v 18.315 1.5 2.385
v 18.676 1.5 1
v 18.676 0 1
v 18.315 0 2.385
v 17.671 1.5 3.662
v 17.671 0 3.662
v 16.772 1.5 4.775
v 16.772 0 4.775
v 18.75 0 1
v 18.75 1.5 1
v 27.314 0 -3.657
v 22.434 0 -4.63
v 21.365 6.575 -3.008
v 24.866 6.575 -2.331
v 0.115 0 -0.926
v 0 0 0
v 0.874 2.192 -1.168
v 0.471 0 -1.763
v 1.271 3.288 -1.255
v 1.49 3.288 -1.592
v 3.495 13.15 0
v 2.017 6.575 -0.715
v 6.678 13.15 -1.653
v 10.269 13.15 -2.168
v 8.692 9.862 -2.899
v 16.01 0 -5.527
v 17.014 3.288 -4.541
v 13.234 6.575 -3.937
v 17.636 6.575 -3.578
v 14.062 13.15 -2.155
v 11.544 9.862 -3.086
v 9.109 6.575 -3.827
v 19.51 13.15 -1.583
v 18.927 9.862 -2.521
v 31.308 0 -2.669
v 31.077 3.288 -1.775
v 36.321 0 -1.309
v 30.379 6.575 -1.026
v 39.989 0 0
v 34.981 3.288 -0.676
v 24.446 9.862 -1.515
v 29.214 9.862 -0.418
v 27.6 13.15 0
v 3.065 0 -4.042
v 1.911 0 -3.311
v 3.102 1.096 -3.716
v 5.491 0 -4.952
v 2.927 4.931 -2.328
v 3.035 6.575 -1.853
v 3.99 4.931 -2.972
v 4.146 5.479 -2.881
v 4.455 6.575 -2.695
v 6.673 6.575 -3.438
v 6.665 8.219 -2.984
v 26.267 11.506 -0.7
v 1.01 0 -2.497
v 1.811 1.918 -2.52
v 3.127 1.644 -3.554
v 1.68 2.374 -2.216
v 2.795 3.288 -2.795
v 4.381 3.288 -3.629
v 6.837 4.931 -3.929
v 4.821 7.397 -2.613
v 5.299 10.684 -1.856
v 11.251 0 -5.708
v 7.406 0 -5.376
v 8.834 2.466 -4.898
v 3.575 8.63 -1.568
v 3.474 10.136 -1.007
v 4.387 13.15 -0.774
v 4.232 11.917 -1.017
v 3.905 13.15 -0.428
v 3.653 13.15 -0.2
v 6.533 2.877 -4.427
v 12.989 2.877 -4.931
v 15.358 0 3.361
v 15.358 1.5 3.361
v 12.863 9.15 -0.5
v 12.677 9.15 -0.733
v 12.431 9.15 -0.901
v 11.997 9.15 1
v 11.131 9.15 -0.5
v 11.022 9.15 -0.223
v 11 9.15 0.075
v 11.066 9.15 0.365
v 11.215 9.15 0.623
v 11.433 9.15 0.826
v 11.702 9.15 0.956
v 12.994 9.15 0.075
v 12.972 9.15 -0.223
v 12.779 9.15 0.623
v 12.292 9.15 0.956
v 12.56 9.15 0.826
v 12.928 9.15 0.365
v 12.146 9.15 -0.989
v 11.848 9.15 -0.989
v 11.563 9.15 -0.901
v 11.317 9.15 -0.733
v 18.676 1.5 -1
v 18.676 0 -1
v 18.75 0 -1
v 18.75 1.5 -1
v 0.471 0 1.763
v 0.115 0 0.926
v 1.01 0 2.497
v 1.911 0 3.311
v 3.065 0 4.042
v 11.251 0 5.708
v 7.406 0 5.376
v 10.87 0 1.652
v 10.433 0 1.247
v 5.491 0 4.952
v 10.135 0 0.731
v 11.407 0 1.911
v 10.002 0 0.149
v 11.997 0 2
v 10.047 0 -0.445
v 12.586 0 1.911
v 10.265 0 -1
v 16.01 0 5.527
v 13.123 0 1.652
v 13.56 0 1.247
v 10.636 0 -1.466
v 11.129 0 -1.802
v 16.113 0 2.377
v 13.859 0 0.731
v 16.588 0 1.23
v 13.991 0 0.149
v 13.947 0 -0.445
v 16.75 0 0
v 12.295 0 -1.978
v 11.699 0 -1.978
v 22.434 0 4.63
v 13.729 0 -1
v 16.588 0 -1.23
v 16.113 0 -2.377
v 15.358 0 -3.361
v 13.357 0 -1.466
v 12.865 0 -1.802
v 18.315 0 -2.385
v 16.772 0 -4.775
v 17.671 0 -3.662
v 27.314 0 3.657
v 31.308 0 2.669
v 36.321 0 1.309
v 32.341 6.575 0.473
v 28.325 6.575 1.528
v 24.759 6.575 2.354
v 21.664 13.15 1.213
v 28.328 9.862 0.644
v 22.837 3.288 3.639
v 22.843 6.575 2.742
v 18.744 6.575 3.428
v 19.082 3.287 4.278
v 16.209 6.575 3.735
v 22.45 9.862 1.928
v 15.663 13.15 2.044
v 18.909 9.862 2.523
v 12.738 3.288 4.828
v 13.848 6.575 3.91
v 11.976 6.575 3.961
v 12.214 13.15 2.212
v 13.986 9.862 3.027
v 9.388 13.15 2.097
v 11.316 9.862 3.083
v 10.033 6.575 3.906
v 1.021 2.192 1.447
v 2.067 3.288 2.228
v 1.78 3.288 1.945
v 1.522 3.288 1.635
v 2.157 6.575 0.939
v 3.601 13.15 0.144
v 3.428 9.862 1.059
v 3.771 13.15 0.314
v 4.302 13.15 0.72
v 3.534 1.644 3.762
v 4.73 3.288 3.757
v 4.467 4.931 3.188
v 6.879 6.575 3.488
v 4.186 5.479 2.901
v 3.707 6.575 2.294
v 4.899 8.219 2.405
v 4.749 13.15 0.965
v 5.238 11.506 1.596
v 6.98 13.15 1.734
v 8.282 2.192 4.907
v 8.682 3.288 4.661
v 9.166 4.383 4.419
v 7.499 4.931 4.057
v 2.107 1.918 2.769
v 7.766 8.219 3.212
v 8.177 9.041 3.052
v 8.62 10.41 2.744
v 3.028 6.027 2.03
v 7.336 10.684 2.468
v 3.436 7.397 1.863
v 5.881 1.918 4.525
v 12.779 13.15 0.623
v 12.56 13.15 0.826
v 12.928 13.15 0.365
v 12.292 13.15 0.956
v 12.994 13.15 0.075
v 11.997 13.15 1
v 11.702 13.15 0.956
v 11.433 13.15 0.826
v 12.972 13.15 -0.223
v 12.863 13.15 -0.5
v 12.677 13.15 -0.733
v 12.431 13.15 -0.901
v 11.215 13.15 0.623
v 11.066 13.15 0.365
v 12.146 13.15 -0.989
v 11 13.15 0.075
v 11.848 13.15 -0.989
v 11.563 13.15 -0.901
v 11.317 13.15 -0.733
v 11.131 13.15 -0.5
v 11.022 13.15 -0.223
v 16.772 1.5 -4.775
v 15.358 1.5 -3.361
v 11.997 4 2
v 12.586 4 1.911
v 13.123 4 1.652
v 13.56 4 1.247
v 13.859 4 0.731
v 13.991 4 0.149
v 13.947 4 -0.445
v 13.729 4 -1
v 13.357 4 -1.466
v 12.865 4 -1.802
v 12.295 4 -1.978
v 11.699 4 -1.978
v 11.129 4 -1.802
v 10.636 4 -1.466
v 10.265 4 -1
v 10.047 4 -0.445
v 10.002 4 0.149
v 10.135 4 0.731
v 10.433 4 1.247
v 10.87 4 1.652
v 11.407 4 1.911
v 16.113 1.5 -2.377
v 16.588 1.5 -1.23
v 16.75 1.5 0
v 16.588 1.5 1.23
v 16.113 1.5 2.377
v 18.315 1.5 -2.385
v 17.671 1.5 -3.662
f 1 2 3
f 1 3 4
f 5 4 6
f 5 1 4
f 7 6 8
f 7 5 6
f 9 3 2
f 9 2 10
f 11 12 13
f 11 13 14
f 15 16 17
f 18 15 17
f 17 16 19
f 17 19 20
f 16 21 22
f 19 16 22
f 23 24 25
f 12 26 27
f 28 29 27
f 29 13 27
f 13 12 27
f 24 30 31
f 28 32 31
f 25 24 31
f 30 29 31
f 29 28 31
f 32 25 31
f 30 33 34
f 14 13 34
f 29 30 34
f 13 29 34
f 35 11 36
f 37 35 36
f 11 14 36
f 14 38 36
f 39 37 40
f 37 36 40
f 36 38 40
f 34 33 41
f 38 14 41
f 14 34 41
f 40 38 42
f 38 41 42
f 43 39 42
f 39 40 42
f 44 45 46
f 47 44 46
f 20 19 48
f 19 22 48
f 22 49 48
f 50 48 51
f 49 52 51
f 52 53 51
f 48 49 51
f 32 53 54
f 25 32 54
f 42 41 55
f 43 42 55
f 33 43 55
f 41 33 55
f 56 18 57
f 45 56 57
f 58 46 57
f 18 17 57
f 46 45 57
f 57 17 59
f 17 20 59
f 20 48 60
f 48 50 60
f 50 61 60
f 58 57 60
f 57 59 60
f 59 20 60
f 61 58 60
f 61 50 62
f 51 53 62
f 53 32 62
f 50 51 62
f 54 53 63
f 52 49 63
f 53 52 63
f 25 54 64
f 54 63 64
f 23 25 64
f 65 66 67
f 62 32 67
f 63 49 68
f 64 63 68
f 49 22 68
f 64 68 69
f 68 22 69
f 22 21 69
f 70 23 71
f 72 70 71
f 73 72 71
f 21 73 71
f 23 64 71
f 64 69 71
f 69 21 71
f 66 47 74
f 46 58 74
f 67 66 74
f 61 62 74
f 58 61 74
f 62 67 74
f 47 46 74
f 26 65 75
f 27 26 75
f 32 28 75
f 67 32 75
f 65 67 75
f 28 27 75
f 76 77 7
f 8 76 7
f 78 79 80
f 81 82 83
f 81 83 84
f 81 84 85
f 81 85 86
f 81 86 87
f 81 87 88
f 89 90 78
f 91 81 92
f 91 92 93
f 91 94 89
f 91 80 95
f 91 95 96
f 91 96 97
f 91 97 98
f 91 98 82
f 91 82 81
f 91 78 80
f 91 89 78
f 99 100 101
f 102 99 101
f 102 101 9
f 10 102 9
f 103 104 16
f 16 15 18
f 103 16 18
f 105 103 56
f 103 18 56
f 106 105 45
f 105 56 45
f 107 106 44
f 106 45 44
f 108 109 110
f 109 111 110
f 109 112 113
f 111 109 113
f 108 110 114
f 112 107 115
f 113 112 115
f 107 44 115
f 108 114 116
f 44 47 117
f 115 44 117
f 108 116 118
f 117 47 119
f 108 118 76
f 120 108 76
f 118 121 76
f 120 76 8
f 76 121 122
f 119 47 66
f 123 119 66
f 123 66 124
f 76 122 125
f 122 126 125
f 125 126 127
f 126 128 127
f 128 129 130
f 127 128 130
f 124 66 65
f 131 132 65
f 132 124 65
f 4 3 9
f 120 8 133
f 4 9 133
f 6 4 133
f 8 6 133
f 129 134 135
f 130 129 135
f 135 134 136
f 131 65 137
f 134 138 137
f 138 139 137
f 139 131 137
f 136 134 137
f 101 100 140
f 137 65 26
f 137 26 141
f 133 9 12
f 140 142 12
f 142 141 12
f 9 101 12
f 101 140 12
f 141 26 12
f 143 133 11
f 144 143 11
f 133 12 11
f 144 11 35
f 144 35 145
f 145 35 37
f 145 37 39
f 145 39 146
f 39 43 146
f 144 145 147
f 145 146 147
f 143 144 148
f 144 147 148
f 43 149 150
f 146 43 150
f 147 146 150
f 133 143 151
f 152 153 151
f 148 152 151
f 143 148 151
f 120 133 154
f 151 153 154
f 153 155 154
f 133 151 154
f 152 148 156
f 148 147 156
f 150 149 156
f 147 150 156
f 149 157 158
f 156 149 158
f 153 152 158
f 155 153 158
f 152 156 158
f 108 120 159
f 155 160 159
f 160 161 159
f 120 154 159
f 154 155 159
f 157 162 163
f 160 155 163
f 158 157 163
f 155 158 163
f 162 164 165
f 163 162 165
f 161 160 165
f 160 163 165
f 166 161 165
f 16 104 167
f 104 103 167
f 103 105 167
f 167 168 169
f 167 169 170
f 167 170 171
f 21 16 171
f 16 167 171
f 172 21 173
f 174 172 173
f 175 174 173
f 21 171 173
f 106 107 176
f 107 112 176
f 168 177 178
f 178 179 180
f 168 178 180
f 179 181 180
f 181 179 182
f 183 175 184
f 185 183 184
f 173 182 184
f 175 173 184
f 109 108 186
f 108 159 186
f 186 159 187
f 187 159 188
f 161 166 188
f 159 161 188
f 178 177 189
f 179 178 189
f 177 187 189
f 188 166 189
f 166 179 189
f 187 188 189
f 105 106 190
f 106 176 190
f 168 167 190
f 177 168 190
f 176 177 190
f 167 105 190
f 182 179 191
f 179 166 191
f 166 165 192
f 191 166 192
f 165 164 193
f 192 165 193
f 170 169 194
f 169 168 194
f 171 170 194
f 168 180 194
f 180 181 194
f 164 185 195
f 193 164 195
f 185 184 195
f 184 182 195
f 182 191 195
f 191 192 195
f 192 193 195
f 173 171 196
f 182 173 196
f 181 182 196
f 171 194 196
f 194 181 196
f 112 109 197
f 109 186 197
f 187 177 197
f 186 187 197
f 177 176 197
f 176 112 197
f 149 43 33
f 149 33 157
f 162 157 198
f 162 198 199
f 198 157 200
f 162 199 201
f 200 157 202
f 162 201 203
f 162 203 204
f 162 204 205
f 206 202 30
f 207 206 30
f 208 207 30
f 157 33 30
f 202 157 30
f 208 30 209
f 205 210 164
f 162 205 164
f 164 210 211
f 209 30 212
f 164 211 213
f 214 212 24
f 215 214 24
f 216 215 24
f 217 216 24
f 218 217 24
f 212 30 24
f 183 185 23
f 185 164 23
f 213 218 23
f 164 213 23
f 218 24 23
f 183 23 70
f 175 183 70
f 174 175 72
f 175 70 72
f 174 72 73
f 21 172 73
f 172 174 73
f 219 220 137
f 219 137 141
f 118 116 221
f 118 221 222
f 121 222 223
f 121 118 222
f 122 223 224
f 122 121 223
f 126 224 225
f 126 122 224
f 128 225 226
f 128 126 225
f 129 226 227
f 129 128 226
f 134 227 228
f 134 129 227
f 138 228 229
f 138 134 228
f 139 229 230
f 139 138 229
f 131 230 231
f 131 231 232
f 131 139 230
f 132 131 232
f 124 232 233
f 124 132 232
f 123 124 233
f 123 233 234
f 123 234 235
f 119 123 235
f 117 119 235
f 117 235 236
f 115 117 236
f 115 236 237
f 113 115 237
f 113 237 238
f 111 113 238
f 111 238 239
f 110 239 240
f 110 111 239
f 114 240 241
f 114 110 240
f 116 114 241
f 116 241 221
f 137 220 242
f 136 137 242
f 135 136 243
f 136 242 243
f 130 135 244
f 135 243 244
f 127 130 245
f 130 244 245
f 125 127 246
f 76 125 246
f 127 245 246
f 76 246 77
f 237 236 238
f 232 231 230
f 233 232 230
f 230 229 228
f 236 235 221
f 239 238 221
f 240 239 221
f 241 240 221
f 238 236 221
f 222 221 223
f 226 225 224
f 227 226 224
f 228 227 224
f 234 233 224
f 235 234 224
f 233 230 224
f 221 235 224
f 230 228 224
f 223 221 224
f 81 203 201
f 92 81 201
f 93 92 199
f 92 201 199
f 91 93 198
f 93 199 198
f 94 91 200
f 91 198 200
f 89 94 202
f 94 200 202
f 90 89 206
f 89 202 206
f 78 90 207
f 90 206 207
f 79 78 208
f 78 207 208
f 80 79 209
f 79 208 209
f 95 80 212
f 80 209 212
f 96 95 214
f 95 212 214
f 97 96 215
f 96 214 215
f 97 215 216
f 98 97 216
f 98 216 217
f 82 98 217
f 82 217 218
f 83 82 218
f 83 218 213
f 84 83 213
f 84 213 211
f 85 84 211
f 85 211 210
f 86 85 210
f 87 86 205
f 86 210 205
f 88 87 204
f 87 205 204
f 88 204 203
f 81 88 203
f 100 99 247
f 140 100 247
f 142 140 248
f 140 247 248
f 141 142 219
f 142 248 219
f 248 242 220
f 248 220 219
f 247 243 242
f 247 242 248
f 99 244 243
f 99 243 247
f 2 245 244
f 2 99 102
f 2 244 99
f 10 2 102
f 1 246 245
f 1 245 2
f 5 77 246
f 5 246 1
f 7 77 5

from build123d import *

# Parameters (mm, degrees)
SKETCH_3_R                    = 2
CUT_EXTRUDE_1_DEPTH           = 4
SKETCH_4_R                    = 1
CUT_EXTRUDE_2_DEPTH           = 4
CUT_EXTRUDE_3_DEPTH           = 1.5
SKETCH_7_W                    = 2
SKETCH_7_H                    = 1.5
CUT_REVOLVE_1_ANGLE           = 45
CUT_REVOLVE_1_OTHER_WAY_ANGLE = 45


with BuildPart() as part:
    # Эскиз1 → По сечениям1 section 0
    with BuildSketch(Plane(origin=(0, 0, 0), x_dir=(1, 0, 0), z_dir=(0, 1, 0))):
        with BuildLine():
            add(Edge.make_bspline(
                [(0, 0), (-0.026786257, 0.969360716), (0.61737566, 2.249301934), (1.974829337, 3.392775644), (2.993920842, 4.051952658), (4.355720519, 4.565101355), (5.990808256, 5.164346361), (8.017850303, 5.478919266), (10.008939201, 5.685410864), (12.675837367, 5.745020865), (16.011358195, 5.571319168), (20.019187774, 5.094065908), (23.99962122, 4.335399659), (28.002273256, 3.548249918), (31.989584978, 2.480873774), (36.034216793, 1.4621658), (38.689482894, 0.534654706), (39.98934, 0)],
                knots=[0, 0, 0, 0, 0.063515889, 0.095125078, 0.12262418, 0.147418569, 0.196010901, 0.243367076, 0.289416436, 0.335172983, 0.428593629, 0.521350126, 0.61548124, 0.710185536, 0.804793671, 0.902313957, 1, 1, 1, 1], degree=3))
            add(Edge.make_bspline(
                [(0, 0), (-0.026786257, -0.969360716), (0.61737566, -2.249301934), (1.974829337, -3.392775644), (2.993920842, -4.051952658), (4.355720519, -4.565101355), (5.990808256, -5.164346361), (8.017850303, -5.478919266), (10.008939201, -5.685410864), (12.675837367, -5.745020865), (16.011358195, -5.571319168), (20.019187774, -5.094065908), (23.99962122, -4.335399659), (28.002273256, -3.548249918), (31.989584978, -2.480873774), (36.034216793, -1.4621658), (38.689482894, -0.534654706), (39.98934, 0)],
                knots=[0, 0, 0, 0, 0.063515889, 0.095125078, 0.12262418, 0.147418569, 0.196010901, 0.243367076, 0.289416436, 0.335172983, 0.428593629, 0.521350126, 0.61548124, 0.710185536, 0.804793671, 0.902313957, 1, 1, 1, 1], degree=3))
        make_face()
    # Эскиз2 → По сечениям1 section 1
    with BuildSketch(Plane(origin=(0, 13.15, 0), x_dir=(1, 0, 0), z_dir=(0, 1, 0))):
        with BuildLine():
            add(Edge.make_bspline(
                [(27.600495608, 0), (26.597023876, 0.239787804), (25.590303432, 0.450633429), (24.07845351, 0.751139895), (23.574236087, 0.848926057), (22.565707302, 1.043661503), (22.061334673, 1.140064965), (20.547046456, 1.418849109), (19.535800832, 1.589380729), (17.506159089, 1.866741534), (16.488154051, 1.977054776), (14.445960524, 2.142594028), (13.421688191, 2.197073085), (11.878361295, 2.217156944), (11.362851505, 2.21434148), (10.328296524, 2.177214316), (9.808955229, 2.140264674), (9.027129396, 2.059771774), (8.766490273, 2.029170171), (8.246673774, 1.962396763), (7.98718809, 1.926435537), (7.470450481, 1.84090371), (7.213172633, 1.791491042), (6.703084975, 1.665443783), (6.451257898, 1.58763007), (5.953139588, 1.420127607), (5.706204125, 1.330156877), (5.336512255, 1.193117575), (5.213271138, 1.147312759), (4.967522086, 1.054347625), (4.844966339, 1.007283734), (4.485806342, 0.850578332), (4.26912101, 0.704612862), (3.95354488, 0.468428314), (3.84988299, 0.385871664), (3.704605146, 0.253019135), (3.657777639, 0.207183214), (3.570159407, 0.109650945), (3.528407556, 0.058887646), (3.495024534, 0)],
                knots=[0, 0, 0, 0, 0.125, 0.125, 0.1875, 0.1875, 0.25, 0.25, 0.375, 0.375, 0.5, 0.5, 0.625, 0.625, 0.6875, 0.6875, 0.75, 0.75, 0.78125, 0.78125, 0.8125, 0.8125, 0.84375, 0.84375, 0.875, 0.875, 0.90625, 0.90625, 0.921875, 0.921875, 0.9375, 0.9375, 0.96875, 0.96875, 0.984375, 0.984375, 0.9921875, 0.9921875, 1, 1, 1, 1], degree=3))
            add(Edge.make_bspline(
                [(3.495024534, 0), (3.527836487, -0.057880281), (3.570196415, -0.109749182), (3.658869962, -0.20834136), (3.70652894, -0.254882194), (3.853181237, -0.388672418), (3.956462947, -0.470726548), (4.167794949, -0.628660052), (4.275587446, -0.704873243), (4.499789963, -0.846140938), (4.615390753, -0.907467588), (4.853487439, -1.01062304), (4.974416307, -1.056988781), (5.216688696, -1.148571028), (5.338066313, -1.193693034), (5.702321862, -1.328718991), (5.945643298, -1.417393741), (6.436562197, -1.582891985), (6.684094371, -1.659896431), (7.189108296, -1.786329481), (7.445644373, -1.836258275), (7.9566654, -1.921867633), (8.212450695, -1.957701806), (8.724233006, -2.023999353), (8.980232008, -2.054412341), (9.748649974, -2.134972616), (10.261536754, -2.173252617), (11.288759593, -2.213048165), (11.802997519, -2.217053051), (13.346857368, -2.199994887), (14.378737253, -2.146921583), (16.440497768, -1.981978581), (17.466695193, -1.87149656), (19.509569182, -1.59358314), (20.525655422, -1.422620707), (22.045907717, -1.142986252), (22.552073866, -1.046277871), (23.564078812, -0.850903032), (24.070010899, -0.752794594), (25.586627068, -0.45141053), (26.595958245, -0.240042446), (27.600495608, 0)],
                knots=[0, 0, 0, 0, 0.0078125, 0.0078125, 0.015625, 0.015625, 0.03125, 0.03125, 0.046875, 0.046875, 0.0625, 0.0625, 0.078125, 0.078125, 0.09375, 0.09375, 0.125, 0.125, 0.15625, 0.15625, 0.1875, 0.1875, 0.21875, 0.21875, 0.25, 0.25, 0.3125, 0.3125, 0.375, 0.375, 0.5, 0.5, 0.625, 0.625, 0.75, 0.75, 0.8125, 0.8125, 0.875, 0.875, 1, 1, 1, 1], degree=3))
        make_face()
    loft()

    # Эскиз3 → Вырез-Вытянуть1 (cut)
    with BuildSketch(Plane(origin=(0, 0, 0), x_dir=(1, 0, 0), z_dir=(0, 1, 0))):
        with Locations((11.9968, 0)):
            Circle(SKETCH_3_R)
    extrude(amount=CUT_EXTRUDE_1_DEPTH, mode=Mode.SUBTRACT)

    # Эскиз4 → Вырез-Вытянуть2 (cut)
    with BuildSketch(Plane(origin=(0, 13.15, 0), x_dir=(1, 0, 0), z_dir=(0, 1, 0))):
        with Locations((11.9968, 0)):
            Circle(SKETCH_4_R)
    extrude(amount=-CUT_EXTRUDE_2_DEPTH, mode=Mode.SUBTRACT)

    # Эскиз5 → Вырез-Вытянуть3 (cut)
    with BuildSketch(Plane.XZ):
        Polygon((18.75, 1), (16.75, 1), (16.75, 0), (16.75, -1), (18.75, -1), align=None)
    extrude(amount=-CUT_EXTRUDE_3_DEPTH, mode=Mode.SUBTRACT)

    # Эскиз7 → Вырез-Повернуть1 (revolve, cut)
    with BuildSketch(Plane.XY):
        with Locations((17.75, 0.75)):
            Rectangle(SKETCH_7_W, SKETCH_7_H)
    revolve(axis=Axis((11.9968, 4, 0), (0, -1, 0)), revolution_arc=CUT_REVOLVE_1_ANGLE, mode=Mode.SUBTRACT)

    # Эскиз7 → Вырез-Повернуть1 other way (revolve, cut)
    with BuildSketch(Plane.XY):
        with Locations((17.75, 0.75)):
            Rectangle(SKETCH_7_W, SKETCH_7_H)
    revolve(axis=Axis((11.9968, 4, 0), (0, 1, 0)), revolution_arc=CUT_REVOLVE_1_OTHER_WAY_ANGLE, mode=Mode.SUBTRACT)


solid = part.part
